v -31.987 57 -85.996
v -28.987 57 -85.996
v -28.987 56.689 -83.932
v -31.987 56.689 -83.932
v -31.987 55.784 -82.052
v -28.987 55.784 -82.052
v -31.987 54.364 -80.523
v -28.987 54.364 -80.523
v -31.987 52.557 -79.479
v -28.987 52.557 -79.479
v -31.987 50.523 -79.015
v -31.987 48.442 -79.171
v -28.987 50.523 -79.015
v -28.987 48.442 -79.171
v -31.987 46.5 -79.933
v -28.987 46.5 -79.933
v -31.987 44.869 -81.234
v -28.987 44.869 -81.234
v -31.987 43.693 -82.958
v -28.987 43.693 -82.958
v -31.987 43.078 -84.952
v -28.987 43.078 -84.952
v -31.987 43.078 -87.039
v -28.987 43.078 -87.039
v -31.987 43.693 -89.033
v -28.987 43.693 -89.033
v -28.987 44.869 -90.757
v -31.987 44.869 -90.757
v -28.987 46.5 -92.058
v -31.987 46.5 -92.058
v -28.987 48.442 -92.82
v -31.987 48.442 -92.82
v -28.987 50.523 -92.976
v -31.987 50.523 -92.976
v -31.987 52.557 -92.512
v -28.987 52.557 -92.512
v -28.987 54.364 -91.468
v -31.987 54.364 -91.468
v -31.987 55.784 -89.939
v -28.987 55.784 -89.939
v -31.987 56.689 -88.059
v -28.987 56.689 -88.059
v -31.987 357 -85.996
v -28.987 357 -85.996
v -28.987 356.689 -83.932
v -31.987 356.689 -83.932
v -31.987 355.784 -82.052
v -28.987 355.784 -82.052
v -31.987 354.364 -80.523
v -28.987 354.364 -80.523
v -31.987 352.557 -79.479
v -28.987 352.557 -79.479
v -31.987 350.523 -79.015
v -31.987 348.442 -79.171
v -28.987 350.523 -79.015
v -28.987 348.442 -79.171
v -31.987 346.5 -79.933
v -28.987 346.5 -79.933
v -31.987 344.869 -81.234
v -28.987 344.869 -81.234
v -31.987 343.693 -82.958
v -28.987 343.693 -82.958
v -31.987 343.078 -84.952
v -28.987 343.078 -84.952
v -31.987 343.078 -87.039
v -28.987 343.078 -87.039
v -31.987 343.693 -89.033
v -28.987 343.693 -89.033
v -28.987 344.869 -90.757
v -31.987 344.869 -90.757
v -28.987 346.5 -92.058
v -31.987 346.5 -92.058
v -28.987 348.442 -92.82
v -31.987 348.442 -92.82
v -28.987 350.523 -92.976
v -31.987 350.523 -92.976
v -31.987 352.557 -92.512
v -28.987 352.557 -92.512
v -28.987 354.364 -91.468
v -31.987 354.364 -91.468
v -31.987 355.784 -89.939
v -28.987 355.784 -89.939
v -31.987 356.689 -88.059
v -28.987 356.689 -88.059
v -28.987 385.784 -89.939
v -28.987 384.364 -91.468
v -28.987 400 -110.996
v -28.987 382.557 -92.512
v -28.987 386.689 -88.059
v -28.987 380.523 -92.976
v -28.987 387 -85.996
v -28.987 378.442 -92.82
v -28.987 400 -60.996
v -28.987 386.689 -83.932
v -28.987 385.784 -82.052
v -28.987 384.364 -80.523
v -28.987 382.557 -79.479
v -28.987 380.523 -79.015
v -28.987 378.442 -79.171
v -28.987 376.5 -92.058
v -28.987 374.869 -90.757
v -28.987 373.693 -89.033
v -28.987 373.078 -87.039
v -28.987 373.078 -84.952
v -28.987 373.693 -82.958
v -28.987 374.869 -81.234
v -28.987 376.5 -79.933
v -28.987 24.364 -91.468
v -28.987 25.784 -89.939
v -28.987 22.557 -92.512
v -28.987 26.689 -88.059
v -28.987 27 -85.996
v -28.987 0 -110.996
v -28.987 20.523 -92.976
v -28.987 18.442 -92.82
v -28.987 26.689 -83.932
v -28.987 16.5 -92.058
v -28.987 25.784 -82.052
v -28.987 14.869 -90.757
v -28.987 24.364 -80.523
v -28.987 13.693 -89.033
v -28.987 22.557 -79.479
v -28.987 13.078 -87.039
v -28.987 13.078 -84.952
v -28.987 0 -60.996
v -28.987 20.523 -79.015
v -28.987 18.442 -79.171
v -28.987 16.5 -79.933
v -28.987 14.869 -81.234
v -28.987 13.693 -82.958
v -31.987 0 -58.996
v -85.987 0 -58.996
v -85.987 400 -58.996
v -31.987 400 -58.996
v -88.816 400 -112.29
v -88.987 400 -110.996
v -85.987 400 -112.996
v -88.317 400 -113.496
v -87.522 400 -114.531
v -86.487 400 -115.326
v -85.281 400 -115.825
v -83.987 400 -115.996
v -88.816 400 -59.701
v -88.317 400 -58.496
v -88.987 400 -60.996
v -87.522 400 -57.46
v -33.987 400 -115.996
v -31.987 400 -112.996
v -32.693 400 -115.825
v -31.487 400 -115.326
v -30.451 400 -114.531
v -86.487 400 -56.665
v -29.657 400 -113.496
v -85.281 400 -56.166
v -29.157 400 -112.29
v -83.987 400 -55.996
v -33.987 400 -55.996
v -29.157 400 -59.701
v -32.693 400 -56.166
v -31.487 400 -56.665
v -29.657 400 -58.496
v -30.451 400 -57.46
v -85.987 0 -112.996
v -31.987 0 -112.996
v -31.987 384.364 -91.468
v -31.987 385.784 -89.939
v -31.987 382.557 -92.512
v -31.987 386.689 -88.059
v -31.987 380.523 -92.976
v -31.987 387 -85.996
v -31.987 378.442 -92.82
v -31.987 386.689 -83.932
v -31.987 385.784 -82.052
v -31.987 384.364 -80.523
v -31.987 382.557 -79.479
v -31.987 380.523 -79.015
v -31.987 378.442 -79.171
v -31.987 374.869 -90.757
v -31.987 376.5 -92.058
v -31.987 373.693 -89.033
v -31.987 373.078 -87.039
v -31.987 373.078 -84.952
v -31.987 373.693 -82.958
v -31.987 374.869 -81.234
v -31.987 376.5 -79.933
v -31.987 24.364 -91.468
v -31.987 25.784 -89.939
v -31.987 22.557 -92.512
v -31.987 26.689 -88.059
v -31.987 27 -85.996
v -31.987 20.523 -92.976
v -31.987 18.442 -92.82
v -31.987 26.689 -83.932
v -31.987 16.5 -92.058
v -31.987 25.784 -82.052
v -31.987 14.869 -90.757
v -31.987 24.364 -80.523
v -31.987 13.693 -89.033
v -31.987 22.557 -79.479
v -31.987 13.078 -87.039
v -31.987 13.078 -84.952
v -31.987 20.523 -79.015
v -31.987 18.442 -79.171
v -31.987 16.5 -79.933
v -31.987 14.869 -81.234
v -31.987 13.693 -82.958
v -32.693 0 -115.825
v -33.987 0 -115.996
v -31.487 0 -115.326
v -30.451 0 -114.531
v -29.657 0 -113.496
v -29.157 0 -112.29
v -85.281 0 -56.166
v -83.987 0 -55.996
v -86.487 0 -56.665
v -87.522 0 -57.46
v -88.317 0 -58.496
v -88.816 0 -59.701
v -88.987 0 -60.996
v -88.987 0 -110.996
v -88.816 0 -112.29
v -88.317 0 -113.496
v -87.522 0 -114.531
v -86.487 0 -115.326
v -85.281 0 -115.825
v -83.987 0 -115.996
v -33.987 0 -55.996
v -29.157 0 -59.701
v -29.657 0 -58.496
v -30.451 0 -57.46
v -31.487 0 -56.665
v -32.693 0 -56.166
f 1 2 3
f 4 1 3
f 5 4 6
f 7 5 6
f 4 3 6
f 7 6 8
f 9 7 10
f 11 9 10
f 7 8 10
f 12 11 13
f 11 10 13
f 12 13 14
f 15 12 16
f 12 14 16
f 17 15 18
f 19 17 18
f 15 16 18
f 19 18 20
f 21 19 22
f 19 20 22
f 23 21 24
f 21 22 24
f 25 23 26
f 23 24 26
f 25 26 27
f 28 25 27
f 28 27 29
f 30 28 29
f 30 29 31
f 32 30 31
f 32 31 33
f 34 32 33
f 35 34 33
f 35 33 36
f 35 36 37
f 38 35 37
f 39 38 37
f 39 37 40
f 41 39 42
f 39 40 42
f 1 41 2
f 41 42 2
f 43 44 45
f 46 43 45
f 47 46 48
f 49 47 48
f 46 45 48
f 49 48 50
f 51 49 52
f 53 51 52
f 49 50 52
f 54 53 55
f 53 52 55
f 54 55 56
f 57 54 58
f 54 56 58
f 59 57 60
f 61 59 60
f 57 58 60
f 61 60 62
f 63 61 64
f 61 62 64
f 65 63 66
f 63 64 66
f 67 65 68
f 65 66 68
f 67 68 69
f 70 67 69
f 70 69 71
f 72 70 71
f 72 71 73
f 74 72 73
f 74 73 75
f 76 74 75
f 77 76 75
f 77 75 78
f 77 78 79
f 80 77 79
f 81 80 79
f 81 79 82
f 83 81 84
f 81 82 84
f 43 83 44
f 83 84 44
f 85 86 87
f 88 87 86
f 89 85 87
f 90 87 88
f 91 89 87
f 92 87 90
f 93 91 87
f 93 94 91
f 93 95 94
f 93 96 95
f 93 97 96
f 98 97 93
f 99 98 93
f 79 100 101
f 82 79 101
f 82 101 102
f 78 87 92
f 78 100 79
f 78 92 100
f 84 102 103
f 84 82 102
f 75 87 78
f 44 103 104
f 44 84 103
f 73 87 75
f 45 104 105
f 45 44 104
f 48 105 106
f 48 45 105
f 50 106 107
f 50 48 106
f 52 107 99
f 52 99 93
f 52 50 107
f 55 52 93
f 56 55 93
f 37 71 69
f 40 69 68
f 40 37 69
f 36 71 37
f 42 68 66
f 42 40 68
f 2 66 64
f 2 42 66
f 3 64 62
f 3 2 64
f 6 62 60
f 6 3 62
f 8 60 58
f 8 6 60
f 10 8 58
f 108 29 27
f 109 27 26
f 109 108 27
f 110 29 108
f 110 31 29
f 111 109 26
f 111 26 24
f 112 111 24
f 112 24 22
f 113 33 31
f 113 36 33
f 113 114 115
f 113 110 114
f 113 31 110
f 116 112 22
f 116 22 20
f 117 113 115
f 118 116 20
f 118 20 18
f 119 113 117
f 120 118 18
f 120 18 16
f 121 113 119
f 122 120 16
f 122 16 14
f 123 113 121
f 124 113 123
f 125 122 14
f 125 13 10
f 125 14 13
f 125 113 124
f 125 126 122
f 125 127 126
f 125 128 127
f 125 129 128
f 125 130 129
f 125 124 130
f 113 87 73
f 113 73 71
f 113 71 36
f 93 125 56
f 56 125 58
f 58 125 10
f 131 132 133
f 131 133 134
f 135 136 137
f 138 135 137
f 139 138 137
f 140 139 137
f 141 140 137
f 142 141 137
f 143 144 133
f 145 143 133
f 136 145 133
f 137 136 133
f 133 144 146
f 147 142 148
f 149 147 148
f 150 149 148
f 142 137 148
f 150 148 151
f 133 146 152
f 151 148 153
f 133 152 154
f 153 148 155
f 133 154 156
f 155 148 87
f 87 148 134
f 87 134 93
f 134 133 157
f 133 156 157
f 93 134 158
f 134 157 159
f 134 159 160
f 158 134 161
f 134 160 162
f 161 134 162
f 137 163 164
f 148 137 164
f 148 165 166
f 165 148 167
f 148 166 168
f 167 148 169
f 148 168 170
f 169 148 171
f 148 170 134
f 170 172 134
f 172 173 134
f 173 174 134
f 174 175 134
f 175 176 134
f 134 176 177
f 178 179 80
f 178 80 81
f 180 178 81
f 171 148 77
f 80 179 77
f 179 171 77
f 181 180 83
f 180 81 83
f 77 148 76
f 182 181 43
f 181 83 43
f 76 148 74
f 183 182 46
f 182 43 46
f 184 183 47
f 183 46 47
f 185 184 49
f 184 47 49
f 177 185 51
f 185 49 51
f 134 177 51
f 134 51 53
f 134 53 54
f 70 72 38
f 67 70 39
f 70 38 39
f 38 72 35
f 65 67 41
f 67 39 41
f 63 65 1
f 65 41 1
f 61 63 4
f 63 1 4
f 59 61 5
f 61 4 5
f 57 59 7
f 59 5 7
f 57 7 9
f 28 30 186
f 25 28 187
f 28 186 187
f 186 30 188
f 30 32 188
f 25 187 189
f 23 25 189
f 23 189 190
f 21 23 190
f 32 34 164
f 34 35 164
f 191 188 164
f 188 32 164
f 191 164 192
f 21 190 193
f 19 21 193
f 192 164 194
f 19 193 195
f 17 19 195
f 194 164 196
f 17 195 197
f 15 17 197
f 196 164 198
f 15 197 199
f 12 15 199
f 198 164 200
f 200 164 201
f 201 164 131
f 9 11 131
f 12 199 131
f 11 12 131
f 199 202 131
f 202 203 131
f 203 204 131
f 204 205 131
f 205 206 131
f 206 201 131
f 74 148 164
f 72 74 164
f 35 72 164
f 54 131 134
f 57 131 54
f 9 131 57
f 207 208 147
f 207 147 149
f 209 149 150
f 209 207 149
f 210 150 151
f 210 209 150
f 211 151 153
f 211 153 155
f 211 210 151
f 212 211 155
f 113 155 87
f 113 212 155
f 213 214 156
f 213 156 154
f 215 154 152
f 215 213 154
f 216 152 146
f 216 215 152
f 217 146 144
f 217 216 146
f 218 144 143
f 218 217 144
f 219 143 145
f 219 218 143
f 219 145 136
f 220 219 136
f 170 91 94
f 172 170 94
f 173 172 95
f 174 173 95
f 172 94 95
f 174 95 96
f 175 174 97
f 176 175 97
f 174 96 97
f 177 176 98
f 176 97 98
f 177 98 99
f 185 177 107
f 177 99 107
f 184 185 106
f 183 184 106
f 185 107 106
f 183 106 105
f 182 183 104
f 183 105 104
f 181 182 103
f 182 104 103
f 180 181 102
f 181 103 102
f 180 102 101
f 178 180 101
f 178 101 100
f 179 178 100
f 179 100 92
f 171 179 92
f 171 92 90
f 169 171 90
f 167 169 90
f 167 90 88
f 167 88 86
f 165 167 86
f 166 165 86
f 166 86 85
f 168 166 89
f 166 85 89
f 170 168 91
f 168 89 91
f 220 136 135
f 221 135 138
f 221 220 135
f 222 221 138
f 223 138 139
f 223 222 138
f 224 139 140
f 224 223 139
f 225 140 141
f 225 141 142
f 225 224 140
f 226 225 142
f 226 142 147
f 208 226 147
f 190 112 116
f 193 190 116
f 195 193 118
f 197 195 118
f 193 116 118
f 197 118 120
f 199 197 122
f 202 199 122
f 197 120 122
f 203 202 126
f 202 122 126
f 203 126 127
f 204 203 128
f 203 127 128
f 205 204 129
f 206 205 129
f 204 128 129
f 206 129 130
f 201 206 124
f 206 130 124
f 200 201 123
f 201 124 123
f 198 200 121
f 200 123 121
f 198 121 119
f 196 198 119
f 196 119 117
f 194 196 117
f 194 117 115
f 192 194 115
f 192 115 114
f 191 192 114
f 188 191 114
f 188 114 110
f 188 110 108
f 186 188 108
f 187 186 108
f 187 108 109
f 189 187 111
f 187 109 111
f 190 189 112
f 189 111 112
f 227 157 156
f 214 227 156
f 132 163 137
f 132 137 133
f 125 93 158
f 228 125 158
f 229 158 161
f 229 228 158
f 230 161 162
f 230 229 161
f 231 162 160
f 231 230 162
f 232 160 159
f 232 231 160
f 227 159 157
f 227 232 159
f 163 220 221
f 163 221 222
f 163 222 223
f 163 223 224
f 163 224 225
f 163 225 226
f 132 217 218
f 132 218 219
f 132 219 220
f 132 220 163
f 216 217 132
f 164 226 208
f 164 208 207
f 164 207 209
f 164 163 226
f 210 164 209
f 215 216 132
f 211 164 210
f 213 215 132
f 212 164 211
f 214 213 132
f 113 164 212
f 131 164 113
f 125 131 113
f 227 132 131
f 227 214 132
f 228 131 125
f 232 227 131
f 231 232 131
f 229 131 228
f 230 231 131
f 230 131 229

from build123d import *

# Parameters (mm, degrees)
F0_W     = 54
F0_H     = 54
F1_DEPTH = 400
F2_R     = 7
F3_DEPTH = 3


# Not quite as in the source:
# - a feature names something its author has since deleted; it is built from what else it names


with BuildPart() as f1:
    # F0 (on Front) → F1 (new body)
    with BuildSketch(Plane.XZ):
        with BuildLine():
            ThreePointArc((-28.9867345989, -60.995567819), (-30.4512006929, -57.460033913), (-33.9867345989, -55.995567819))
            Line((-33.9867345989, -55.995567819), (-83.9867345989, -55.995567819))
            ThreePointArc((-83.9867345989, -55.995567819), (-87.5222685048, -57.460033913), (-88.9867345989, -60.995567819))
            Line((-88.9867345989, -60.995567819), (-88.9867345989, -110.995567819))
            ThreePointArc((-88.9867345989, -110.995567819), (-87.5222685048, -114.5311017249), (-83.9867345989, -115.995567819))
            Line((-83.9867345989, -115.995567819), (-33.9867345989, -115.995567819))
            ThreePointArc((-33.9867345989, -115.995567819), (-30.4512006929, -114.5311017249), (-28.9867345989, -110.995567819))
            Line((-28.9867345989, -110.995567819), (-28.9867345989, -60.995567819))
        make_face()
        with Locations((-58.9867345989, -85.995567819)):
            Rectangle(F0_W, F0_H, mode=Mode.SUBTRACT)
    extrude(amount=-F1_DEPTH)

    # F2 (on face) → F3 (cut, through all)
    with BuildSketch(Plane.YZ.offset(-28.9867345989)):
        with Locations((20, -85.995567819)):
            Circle(F2_R)
        with Locations((50, -85.995567819)):
            Circle(F2_R)
        with Locations((350, -85.995567819)):
            Circle(F2_R)
        with Locations((380, -85.995567819)):
            Circle(F2_R)
    extrude(amount=-F3_DEPTH, mode=Mode.SUBTRACT)


solid = f1.part
